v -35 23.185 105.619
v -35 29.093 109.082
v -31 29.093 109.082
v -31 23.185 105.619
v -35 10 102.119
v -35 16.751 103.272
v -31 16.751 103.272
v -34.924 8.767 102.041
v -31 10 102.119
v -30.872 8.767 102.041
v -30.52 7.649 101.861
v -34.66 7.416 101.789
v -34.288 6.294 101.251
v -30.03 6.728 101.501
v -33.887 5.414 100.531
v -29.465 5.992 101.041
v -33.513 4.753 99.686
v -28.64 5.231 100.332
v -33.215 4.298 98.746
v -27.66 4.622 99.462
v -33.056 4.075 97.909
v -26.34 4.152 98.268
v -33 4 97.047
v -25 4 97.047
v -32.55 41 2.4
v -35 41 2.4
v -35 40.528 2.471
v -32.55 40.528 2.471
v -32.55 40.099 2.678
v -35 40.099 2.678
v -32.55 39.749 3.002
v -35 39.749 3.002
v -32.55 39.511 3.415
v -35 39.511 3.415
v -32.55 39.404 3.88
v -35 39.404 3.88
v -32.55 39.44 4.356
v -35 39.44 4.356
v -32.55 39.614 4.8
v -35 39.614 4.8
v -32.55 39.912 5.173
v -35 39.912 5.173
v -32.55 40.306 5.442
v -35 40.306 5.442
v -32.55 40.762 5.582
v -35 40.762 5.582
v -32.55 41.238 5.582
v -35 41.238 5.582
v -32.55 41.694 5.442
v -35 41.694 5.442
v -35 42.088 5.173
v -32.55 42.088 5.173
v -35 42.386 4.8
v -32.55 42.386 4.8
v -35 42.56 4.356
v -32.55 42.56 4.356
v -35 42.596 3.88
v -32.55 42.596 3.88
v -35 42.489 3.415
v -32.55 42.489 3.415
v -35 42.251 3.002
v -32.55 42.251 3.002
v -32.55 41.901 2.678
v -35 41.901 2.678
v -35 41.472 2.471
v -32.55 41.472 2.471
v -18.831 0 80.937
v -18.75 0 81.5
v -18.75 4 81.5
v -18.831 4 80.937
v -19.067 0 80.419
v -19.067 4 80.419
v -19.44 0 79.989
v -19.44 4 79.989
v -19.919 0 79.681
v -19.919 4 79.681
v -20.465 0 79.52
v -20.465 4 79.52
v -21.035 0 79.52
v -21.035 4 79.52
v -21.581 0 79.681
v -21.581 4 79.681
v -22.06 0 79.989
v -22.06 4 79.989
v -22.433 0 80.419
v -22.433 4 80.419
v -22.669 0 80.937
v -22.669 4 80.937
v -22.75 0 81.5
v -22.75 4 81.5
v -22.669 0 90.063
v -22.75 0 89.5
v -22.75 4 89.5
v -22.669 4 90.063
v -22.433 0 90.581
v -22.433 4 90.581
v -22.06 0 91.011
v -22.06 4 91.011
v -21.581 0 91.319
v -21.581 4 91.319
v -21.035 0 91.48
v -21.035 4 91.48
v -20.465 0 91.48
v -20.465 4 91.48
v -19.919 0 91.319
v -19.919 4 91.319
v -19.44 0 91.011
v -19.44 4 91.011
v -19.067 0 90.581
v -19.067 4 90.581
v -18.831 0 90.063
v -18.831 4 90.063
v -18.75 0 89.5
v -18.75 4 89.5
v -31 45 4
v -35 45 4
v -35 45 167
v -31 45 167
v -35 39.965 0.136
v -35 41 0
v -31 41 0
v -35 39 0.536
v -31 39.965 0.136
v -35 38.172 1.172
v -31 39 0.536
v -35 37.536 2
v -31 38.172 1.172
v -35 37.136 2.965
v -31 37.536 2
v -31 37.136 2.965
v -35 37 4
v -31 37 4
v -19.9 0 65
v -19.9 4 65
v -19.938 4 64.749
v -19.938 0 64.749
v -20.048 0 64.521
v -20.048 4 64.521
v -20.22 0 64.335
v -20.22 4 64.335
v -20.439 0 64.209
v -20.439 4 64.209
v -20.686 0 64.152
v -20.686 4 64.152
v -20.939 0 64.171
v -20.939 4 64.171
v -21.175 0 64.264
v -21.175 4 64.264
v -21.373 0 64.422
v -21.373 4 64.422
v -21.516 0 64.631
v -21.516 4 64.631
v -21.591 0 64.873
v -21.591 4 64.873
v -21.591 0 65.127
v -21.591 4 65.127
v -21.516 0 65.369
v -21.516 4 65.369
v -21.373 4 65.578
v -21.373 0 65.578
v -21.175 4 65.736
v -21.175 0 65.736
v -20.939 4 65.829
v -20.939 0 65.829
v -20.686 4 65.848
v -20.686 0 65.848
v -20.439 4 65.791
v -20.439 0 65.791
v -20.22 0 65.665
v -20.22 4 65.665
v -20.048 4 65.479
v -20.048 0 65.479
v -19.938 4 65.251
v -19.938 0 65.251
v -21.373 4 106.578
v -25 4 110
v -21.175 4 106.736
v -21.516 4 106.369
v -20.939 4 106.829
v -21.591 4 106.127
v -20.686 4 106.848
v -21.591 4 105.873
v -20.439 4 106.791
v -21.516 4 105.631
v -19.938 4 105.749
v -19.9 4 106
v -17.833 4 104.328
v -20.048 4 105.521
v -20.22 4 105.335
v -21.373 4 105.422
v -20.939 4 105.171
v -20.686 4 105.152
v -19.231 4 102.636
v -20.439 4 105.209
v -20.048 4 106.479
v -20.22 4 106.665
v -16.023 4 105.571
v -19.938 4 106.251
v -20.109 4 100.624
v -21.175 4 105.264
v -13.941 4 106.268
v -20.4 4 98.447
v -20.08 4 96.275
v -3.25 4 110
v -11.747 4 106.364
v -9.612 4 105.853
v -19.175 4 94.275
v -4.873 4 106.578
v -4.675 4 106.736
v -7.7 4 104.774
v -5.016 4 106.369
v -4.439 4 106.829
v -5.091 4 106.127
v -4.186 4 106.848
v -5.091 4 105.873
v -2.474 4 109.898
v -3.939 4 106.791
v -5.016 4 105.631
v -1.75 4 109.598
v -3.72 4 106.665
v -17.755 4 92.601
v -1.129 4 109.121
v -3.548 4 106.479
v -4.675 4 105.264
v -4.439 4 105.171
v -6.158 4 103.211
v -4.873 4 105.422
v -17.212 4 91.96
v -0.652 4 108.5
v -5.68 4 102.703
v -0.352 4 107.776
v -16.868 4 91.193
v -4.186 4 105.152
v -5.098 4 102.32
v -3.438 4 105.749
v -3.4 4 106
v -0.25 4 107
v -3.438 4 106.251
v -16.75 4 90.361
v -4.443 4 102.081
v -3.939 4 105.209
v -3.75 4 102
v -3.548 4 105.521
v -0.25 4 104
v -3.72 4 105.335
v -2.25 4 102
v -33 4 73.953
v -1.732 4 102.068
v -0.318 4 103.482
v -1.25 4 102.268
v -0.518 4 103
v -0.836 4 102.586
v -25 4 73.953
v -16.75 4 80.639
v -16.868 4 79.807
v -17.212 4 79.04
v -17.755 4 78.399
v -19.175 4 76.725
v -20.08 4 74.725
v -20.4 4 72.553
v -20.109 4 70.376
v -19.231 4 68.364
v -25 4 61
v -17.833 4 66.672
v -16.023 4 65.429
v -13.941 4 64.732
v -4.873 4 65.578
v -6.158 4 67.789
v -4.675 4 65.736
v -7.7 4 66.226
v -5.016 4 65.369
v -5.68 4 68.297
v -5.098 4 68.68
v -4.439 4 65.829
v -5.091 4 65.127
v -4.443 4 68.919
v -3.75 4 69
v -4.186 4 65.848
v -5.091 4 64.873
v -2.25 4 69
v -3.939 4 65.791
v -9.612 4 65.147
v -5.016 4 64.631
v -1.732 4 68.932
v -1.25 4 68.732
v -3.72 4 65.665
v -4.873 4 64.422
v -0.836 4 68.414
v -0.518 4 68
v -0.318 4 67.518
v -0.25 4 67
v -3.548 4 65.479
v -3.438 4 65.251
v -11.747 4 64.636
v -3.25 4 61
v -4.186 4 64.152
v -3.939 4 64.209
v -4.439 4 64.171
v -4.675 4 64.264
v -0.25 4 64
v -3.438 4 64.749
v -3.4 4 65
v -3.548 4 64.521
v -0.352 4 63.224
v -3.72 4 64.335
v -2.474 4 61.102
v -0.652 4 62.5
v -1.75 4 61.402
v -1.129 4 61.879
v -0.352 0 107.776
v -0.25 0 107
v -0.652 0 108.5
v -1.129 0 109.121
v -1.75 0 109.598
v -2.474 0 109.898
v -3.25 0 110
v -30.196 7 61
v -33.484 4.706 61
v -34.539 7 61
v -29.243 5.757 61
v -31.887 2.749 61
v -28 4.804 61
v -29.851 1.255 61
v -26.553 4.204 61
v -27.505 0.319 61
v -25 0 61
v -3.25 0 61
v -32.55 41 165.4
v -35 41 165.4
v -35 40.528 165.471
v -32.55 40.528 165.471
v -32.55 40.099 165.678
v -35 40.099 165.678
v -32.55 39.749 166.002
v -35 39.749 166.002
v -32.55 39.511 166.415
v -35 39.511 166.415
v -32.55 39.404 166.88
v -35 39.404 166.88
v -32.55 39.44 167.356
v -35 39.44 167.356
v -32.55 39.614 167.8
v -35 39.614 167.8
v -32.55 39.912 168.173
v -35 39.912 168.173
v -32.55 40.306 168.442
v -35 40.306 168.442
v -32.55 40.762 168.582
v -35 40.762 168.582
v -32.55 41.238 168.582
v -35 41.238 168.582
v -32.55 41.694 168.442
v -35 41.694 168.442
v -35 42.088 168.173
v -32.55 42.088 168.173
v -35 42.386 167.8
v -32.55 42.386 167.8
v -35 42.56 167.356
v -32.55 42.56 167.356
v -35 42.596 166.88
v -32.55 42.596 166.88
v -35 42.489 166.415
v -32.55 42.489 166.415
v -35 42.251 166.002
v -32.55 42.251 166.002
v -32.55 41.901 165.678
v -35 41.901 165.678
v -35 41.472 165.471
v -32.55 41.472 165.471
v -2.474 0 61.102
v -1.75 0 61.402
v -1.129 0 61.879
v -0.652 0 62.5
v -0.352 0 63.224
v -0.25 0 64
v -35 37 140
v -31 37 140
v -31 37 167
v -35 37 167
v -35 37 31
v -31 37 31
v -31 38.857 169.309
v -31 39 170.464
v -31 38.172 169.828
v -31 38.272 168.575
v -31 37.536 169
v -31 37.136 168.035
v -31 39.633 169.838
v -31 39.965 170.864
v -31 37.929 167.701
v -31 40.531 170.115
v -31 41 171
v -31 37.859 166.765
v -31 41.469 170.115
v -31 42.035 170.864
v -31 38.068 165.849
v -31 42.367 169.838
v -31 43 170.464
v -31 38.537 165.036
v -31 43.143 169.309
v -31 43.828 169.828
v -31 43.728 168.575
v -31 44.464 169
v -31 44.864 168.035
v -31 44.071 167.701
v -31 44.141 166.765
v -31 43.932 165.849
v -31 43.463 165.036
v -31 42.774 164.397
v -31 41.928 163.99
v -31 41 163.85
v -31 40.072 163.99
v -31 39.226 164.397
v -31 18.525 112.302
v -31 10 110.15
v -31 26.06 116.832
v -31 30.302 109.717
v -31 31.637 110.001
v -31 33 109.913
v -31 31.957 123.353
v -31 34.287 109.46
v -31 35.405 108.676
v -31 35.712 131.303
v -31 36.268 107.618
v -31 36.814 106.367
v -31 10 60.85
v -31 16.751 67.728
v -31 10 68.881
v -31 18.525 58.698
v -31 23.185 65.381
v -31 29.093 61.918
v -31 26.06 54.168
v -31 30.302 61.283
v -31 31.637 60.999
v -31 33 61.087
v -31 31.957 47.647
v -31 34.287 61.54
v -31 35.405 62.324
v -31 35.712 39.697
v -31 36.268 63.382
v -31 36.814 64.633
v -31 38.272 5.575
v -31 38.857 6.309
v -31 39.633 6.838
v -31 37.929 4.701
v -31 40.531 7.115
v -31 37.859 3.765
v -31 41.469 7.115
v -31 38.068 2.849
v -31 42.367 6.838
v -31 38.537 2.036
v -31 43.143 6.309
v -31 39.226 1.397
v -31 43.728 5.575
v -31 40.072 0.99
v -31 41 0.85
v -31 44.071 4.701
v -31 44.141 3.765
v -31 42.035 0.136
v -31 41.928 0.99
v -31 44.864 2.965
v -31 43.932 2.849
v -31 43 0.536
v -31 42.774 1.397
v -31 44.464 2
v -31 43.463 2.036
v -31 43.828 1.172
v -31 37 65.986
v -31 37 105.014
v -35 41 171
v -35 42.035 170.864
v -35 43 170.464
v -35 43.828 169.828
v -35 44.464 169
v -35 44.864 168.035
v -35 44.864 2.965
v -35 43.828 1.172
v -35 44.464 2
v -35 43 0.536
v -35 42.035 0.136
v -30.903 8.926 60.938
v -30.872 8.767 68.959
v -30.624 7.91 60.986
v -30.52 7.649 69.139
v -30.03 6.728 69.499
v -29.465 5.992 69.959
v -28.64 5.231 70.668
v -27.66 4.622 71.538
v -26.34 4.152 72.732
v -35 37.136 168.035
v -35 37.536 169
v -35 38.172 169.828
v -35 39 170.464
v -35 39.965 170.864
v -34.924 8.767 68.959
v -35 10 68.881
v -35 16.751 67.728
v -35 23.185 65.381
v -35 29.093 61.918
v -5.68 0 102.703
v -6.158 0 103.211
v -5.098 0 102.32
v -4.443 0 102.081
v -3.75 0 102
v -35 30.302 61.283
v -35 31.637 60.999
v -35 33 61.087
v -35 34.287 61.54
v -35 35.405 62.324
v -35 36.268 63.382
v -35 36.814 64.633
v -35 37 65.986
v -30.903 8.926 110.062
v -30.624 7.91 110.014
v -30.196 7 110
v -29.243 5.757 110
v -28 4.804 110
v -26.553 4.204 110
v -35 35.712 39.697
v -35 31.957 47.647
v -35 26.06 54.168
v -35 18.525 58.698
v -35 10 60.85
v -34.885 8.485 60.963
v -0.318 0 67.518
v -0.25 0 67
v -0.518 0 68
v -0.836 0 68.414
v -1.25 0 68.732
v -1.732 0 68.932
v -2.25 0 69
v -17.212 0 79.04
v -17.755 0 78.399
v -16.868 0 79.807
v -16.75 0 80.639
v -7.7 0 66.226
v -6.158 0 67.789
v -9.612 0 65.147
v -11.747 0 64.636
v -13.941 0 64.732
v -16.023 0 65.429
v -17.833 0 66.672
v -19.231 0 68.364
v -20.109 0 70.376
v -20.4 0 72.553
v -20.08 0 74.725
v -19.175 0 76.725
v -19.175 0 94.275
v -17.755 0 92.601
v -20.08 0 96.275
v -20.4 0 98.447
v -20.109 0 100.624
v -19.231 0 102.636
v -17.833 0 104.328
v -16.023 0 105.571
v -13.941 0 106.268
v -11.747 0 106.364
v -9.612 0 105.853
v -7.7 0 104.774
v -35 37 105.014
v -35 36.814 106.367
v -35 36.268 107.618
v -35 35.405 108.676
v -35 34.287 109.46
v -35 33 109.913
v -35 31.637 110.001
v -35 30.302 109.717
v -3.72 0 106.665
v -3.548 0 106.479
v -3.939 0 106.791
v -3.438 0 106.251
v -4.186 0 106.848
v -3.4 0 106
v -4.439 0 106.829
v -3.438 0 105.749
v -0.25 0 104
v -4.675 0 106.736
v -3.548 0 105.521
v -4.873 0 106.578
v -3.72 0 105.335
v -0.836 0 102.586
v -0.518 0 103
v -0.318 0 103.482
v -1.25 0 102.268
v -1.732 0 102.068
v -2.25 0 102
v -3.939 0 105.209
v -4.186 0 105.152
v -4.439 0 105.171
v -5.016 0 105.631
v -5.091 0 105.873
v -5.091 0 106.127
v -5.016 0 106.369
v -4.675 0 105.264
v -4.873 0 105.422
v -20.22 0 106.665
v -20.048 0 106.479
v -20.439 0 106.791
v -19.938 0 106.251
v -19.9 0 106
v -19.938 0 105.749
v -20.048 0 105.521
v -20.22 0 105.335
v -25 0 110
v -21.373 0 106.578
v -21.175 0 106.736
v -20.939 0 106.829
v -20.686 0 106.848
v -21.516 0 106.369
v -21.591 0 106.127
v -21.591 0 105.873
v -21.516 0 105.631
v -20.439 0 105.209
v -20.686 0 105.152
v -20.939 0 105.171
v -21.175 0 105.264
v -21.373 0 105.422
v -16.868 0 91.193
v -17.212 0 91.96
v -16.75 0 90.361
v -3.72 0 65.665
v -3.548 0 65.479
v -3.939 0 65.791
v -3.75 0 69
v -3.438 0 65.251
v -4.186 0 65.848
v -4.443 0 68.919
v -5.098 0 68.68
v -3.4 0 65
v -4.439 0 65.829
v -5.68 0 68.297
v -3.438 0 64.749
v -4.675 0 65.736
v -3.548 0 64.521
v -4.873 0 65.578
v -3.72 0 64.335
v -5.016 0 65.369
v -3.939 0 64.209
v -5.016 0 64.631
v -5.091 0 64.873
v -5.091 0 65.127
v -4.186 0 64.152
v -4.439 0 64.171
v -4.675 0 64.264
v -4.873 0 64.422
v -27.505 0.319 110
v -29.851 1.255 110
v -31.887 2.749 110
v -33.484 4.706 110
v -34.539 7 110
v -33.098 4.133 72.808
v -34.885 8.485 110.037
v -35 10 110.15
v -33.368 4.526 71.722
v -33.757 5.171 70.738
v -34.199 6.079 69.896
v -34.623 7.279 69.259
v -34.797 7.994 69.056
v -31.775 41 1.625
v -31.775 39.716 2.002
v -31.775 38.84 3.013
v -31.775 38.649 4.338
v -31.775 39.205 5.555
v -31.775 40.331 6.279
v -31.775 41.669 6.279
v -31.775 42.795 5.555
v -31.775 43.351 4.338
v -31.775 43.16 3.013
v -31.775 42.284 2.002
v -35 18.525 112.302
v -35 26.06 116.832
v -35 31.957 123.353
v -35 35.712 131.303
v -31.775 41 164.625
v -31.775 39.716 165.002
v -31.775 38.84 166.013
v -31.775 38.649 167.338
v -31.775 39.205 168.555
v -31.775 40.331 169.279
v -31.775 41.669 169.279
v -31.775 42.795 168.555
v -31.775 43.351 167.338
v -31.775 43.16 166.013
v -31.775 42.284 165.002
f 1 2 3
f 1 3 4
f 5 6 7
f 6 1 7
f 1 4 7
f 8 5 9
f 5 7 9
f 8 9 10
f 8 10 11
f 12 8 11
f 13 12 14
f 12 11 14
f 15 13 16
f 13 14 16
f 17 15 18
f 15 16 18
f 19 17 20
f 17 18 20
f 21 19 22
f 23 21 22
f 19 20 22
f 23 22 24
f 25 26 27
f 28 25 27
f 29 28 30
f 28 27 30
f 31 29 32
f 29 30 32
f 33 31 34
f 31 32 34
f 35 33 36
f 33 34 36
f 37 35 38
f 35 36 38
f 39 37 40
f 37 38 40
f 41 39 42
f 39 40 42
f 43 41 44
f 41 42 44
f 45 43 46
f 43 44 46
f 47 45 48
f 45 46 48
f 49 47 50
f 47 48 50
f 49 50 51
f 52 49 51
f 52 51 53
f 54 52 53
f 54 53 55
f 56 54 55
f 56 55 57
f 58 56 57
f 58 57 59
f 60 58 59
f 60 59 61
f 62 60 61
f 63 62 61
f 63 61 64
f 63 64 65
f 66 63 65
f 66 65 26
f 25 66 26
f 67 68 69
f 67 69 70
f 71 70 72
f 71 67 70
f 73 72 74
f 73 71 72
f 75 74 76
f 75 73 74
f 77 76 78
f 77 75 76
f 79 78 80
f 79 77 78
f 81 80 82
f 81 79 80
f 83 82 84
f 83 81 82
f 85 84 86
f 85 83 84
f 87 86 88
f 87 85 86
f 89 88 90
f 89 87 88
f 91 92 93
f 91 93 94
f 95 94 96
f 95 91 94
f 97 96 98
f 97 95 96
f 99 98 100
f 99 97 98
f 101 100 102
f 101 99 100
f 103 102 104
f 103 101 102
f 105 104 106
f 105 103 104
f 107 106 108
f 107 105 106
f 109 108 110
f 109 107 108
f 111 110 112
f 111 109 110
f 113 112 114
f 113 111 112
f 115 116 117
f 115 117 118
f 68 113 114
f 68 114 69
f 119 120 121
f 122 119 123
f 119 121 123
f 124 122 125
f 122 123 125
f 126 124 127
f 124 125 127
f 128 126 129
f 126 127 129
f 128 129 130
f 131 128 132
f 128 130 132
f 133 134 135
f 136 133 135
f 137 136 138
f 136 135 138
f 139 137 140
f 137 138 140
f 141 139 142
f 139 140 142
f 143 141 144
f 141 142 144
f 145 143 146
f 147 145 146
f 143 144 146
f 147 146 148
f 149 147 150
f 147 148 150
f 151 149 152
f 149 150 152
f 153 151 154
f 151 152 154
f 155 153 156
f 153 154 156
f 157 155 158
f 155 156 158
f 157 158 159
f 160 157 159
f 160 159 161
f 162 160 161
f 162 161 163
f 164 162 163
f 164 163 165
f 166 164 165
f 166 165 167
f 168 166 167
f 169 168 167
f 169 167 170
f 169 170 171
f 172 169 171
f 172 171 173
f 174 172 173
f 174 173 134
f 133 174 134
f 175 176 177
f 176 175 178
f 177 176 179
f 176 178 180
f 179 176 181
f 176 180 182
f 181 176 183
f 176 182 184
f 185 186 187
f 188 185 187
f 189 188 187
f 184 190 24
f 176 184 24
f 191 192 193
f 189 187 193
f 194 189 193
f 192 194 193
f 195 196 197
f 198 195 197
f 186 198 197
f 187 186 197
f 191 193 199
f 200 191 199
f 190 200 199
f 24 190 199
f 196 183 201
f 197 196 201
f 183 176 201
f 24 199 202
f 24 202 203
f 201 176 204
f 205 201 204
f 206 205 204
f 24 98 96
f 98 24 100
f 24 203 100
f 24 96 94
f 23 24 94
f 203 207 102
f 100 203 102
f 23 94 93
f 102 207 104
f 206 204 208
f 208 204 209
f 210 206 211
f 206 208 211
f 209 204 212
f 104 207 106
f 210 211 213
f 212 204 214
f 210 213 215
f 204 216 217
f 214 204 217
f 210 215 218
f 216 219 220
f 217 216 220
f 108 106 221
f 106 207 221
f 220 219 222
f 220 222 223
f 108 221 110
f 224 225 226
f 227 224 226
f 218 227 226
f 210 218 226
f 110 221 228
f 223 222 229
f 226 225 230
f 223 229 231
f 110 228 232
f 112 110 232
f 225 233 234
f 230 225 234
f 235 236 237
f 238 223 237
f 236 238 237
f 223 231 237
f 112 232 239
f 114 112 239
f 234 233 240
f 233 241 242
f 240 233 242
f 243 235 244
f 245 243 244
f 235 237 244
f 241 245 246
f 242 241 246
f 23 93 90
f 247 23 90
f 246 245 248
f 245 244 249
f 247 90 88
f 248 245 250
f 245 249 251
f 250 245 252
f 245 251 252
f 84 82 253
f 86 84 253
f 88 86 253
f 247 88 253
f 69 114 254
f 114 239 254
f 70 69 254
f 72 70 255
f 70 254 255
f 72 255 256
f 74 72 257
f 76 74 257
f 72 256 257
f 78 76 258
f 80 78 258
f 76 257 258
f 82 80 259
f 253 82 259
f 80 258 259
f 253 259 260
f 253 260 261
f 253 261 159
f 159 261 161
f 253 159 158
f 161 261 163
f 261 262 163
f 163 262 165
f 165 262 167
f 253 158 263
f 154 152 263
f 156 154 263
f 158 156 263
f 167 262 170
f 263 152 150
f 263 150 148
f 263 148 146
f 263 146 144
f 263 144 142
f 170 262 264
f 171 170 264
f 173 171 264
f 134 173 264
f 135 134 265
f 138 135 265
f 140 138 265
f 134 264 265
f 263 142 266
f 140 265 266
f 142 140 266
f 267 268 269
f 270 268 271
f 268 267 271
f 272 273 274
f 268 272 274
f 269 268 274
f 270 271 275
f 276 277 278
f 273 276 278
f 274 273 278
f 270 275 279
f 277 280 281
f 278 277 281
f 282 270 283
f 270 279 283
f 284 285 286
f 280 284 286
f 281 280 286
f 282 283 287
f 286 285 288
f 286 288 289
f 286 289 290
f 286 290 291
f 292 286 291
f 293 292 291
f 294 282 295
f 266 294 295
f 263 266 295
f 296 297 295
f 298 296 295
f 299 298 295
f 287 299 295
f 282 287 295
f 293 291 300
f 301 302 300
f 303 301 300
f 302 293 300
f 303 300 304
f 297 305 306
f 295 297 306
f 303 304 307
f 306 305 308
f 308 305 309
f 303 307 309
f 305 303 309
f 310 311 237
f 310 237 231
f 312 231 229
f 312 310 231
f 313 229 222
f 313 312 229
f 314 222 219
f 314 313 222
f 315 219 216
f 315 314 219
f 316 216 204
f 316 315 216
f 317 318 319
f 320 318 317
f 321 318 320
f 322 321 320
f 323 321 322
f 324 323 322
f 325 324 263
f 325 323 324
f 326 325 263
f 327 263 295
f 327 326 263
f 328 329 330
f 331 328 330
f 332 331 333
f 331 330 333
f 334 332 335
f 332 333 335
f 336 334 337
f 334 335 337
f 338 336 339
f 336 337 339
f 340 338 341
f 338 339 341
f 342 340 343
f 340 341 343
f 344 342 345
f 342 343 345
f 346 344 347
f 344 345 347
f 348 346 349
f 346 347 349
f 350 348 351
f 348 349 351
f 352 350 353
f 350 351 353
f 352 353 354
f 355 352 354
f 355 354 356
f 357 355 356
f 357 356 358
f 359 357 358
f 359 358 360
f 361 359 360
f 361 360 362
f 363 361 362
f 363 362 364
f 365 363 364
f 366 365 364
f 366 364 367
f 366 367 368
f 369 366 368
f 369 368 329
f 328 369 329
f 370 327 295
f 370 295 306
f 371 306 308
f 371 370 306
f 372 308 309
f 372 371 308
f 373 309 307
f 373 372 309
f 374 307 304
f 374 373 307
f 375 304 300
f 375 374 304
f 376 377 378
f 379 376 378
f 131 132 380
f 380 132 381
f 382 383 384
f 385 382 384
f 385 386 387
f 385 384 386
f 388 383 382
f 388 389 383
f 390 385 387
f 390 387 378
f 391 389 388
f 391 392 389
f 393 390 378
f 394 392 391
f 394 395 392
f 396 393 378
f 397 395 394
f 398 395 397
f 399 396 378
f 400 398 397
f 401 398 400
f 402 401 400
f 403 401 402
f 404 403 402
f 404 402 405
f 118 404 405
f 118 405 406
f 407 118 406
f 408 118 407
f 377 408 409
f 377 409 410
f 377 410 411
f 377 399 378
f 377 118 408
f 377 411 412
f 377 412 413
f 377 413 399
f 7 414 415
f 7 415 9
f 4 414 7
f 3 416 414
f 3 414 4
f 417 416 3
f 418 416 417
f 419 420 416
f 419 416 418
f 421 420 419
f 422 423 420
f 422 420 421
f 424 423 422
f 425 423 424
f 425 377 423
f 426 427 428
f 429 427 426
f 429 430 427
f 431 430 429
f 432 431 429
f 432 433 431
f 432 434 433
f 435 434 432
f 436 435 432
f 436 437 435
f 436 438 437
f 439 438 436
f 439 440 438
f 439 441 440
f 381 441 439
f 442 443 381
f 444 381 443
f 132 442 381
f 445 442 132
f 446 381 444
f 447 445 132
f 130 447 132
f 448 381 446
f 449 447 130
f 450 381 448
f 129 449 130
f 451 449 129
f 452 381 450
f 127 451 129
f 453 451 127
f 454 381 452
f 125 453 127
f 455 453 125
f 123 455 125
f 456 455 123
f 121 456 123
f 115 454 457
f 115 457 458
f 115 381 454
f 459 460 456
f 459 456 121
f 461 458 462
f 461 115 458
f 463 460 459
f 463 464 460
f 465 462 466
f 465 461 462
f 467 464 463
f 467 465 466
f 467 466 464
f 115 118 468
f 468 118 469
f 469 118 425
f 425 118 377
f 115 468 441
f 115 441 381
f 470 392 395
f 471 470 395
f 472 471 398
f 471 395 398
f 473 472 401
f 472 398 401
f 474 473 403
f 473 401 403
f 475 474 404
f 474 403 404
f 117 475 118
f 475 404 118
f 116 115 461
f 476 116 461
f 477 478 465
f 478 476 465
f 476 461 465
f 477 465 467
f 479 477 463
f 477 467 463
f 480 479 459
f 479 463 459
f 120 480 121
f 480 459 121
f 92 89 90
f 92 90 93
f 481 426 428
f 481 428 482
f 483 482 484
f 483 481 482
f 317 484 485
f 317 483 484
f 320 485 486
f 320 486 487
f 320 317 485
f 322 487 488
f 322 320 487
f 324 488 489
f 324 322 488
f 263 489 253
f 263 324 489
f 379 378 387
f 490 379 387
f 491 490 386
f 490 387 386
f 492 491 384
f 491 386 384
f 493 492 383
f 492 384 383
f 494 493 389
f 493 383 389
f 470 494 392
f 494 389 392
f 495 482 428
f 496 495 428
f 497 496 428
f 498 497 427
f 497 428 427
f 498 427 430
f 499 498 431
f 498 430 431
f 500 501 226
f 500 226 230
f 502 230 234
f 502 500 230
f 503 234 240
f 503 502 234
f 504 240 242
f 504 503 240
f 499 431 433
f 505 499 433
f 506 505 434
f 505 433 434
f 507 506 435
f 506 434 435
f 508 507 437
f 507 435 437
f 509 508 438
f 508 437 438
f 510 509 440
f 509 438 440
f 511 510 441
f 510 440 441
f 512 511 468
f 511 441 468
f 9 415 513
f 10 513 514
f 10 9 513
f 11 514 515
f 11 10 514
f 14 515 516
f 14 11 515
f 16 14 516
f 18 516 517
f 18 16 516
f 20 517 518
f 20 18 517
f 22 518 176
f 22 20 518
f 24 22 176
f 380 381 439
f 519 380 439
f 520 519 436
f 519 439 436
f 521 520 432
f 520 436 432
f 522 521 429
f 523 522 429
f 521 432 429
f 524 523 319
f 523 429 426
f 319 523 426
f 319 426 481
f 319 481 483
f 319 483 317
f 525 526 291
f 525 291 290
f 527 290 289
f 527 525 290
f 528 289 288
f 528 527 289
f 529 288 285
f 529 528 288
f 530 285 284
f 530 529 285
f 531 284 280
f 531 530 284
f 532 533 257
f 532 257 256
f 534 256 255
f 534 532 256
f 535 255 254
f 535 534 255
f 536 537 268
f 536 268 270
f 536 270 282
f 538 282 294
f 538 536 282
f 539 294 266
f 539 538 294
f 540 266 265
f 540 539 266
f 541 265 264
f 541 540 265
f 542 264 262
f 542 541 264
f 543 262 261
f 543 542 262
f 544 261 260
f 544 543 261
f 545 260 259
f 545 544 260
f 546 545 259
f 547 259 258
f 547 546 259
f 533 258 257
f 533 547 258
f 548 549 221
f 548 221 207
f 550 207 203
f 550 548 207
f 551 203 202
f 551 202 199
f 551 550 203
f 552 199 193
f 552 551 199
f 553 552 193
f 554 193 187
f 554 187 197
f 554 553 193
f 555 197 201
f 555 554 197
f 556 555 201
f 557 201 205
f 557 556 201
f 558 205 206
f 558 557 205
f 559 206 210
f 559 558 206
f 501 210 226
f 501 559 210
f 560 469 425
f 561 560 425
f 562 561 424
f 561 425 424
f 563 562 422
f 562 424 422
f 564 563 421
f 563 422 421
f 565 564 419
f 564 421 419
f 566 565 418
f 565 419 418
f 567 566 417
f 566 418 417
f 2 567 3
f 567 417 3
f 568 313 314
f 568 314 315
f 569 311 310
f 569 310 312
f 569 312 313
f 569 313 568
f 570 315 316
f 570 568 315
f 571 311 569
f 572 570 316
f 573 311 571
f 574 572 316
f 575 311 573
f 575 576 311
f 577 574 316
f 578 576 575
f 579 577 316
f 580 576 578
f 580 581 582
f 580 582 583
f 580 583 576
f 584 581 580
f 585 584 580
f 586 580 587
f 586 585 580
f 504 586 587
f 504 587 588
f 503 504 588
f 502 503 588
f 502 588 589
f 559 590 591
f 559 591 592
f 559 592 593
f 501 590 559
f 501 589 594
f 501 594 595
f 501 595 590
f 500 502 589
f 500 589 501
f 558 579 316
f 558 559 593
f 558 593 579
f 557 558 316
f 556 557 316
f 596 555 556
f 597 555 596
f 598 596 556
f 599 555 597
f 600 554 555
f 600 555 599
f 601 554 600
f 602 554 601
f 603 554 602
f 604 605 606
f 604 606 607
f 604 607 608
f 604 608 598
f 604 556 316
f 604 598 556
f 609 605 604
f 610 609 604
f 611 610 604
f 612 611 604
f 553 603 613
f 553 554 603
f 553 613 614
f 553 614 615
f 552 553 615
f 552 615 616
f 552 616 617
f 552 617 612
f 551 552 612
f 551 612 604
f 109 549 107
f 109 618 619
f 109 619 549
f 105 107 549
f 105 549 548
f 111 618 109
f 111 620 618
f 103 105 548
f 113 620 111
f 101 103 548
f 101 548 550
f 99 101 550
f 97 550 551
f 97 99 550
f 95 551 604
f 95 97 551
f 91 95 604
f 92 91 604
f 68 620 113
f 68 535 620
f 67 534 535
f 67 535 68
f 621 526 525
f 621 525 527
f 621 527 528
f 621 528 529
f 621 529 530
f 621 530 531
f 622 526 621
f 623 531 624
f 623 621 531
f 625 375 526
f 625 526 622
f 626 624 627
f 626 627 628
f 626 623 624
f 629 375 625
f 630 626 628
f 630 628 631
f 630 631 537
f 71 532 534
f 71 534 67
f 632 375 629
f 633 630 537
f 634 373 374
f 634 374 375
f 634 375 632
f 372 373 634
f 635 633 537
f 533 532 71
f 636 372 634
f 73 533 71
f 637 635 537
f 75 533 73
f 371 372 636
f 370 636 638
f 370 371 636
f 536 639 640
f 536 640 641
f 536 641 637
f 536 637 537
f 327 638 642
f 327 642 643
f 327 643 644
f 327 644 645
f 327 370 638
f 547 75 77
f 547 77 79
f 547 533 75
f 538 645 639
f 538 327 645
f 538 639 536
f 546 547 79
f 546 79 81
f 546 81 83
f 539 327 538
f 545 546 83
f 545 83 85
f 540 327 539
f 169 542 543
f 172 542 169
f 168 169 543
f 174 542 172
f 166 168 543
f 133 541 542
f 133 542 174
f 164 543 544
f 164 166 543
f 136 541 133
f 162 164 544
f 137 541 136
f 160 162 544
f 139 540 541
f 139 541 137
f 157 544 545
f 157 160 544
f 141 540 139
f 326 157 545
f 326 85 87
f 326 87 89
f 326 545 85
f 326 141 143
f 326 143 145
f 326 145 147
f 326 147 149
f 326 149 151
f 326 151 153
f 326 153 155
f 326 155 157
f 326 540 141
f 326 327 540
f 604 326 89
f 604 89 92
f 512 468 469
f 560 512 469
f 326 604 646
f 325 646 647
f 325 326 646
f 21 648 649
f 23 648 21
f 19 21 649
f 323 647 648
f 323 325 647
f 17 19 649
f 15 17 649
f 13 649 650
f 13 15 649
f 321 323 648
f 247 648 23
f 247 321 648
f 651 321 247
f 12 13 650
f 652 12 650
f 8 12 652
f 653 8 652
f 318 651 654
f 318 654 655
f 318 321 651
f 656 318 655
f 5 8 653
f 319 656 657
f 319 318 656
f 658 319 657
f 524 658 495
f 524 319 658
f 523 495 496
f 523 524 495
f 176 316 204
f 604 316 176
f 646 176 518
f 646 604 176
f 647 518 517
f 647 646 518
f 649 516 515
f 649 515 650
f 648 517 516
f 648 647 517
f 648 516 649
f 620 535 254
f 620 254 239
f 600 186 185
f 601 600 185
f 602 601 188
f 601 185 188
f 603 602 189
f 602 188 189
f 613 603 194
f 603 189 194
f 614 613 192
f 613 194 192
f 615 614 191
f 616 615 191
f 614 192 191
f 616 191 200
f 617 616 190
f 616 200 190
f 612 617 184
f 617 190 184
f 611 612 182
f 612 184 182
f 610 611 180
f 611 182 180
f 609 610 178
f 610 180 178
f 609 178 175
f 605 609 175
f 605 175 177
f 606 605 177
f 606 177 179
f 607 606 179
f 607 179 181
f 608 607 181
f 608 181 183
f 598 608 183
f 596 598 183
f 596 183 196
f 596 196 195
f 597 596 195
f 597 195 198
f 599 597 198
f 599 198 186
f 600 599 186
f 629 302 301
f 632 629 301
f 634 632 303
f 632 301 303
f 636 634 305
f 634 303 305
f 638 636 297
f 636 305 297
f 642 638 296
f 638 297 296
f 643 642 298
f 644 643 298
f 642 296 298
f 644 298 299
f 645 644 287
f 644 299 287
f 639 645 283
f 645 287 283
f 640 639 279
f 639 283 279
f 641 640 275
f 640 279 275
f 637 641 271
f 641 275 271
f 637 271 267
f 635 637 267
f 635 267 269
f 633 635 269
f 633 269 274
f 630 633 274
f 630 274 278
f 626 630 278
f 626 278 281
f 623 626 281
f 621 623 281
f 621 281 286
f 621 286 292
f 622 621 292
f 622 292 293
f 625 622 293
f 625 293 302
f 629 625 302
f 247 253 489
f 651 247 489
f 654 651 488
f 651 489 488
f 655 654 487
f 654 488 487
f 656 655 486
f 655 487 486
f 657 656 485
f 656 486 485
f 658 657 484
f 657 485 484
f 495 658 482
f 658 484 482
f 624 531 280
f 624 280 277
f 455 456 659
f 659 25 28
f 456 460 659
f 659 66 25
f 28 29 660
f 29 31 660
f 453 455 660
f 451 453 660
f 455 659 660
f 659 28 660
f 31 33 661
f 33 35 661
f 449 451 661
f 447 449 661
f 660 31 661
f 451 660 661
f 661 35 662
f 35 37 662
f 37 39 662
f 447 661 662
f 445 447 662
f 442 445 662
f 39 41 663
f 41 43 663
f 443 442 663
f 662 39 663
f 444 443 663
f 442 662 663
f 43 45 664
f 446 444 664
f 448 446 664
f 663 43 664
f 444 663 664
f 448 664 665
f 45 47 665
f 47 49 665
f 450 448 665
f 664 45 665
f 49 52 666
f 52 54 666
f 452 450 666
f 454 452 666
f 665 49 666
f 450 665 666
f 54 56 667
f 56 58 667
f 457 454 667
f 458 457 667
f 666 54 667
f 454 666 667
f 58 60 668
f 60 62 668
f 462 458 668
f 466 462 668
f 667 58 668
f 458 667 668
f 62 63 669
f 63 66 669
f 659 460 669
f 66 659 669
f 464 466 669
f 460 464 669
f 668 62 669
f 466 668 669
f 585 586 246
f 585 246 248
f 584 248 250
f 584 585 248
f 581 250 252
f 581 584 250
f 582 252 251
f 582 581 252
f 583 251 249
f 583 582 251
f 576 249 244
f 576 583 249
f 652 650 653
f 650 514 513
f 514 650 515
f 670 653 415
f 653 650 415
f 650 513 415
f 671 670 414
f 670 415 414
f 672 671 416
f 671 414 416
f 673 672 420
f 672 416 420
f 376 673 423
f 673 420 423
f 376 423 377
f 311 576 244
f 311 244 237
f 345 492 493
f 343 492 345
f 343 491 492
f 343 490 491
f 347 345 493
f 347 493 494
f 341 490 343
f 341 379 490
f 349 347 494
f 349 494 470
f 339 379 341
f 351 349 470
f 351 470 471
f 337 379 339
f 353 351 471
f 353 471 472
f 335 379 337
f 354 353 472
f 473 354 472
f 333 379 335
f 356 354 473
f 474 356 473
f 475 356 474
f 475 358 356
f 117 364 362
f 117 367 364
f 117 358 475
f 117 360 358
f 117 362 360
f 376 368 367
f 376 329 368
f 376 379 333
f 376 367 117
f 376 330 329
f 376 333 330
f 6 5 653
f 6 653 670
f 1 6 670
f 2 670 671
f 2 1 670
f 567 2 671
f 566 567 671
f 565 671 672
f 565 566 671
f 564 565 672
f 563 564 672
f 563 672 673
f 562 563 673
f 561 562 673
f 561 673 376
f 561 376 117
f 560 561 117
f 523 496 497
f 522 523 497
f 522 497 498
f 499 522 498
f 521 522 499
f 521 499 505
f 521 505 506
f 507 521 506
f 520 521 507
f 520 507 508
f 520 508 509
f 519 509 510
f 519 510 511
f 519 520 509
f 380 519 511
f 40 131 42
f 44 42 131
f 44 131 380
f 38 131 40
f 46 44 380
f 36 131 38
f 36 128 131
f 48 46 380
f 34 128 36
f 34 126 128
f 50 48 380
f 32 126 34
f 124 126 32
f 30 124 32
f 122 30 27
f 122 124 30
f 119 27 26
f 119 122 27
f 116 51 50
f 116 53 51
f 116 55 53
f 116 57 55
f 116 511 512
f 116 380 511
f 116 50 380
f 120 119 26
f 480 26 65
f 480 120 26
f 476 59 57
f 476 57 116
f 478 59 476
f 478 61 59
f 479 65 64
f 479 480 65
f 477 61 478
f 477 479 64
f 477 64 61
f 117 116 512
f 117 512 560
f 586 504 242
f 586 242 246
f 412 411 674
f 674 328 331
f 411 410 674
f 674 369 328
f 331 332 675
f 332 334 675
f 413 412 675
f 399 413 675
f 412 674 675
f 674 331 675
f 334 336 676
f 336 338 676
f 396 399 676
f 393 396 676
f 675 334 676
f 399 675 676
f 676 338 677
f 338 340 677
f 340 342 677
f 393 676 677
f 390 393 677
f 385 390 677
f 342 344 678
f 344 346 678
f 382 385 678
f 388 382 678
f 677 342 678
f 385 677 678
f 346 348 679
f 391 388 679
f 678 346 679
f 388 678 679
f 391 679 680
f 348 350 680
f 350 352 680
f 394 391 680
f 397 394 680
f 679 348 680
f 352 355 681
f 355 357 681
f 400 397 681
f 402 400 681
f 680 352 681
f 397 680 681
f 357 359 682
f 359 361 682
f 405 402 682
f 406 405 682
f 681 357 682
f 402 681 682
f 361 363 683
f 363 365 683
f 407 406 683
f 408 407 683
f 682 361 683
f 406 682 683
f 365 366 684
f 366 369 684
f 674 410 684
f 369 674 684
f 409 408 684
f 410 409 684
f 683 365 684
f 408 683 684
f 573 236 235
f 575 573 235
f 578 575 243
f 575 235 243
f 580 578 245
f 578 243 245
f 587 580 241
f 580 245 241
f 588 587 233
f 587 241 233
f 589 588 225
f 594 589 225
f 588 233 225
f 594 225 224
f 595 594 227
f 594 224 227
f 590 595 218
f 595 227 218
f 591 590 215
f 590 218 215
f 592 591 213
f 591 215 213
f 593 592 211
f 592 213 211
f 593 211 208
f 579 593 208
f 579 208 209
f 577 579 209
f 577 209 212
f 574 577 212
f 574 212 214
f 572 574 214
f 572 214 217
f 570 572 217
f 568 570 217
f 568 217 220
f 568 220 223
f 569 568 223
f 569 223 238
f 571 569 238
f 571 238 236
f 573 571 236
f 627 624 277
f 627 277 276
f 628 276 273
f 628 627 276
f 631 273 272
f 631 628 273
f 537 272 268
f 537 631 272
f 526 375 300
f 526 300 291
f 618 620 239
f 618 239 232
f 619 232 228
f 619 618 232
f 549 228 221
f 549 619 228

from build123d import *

# Parameters (mm, degrees)
BOSS_EXTRU_1_DEPTH                             = 171
FRAISAGE_POUR_VIS_T_TE_FRAIS_E_M31_D           = 3.2
FRAISAGE_POUR_VIS_T_TE_FRAIS_E_M31_DEPTH       = 4
FRAISAGE_POUR_VIS_T_TE_FRAIS_E_M31_CSINK_D     = 6.3
FRAISAGE_POUR_VIS_T_TE_FRAIS_E_M31_CSINK_ANGLE = 90
D_GAGEMENT_M1_61_D                             = 1.7
D_GAGEMENT_M1_61_DEPTH                         = 4
ENL_V_MAT_EXTRU_1_DEPTH                        = 4
ENL_V_MAT_EXTRU_2_DEPTH                        = 31.75
ENL_V_MAT_EXTRU_2_DEPTH_BACK                   = 5


with BuildPart() as part:
    # Esquisse1 → Boss.-Extru.1 (new body)
    with BuildSketch(Plane.XY):
        with BuildLine():
            Line((0, 0), (-25, 0))
            ThreePointArc((-25, 0), (-32.071067812, 2.928932188), (-35, 10))
            Line((-35, 10), (-35, 45))
            Line((-35, 45), (-31, 45))
            Line((-31, 45), (-31, 10))
            ThreePointArc((-31, 10), (-29.242640687, 5.757359313), (-25, 4))
            Line((-25, 4), (0, 4))
            Line((0, 4), (0, 0))
        make_face()
    extrude(amount=BOSS_EXTRU_1_DEPTH)

    # Fraisage pour vis à tête fraisée M31
    with Locations(Plane(origin=(-31, 0, 0), x_dir=(0, 0, 1), z_dir=(1, 0, 0))):
        with Locations((4, -41), (167, -41)):
            CounterSinkHole(FRAISAGE_POUR_VIS_T_TE_FRAIS_E_M31_D / 2, FRAISAGE_POUR_VIS_T_TE_FRAIS_E_M31_CSINK_D / 2, depth=FRAISAGE_POUR_VIS_T_TE_FRAIS_E_M31_DEPTH, counter_sink_angle=FRAISAGE_POUR_VIS_T_TE_FRAIS_E_M31_CSINK_ANGLE)

    # Dégagement M1.61
    with Locations(Plane(origin=(0, 0, 0), x_dir=(-1, 0, 0), z_dir=(0, -1, 0))):
        with Locations((20.75, -65), (20.75, -106), (4.25, -106), (4.25, -65)):
            Hole(D_GAGEMENT_M1_61_D / 2, depth=D_GAGEMENT_M1_61_DEPTH)

    # Esquisse6 → Enlèv. mat.-Extru.1 (cut)
    with BuildSketch(Plane.XZ):
        with BuildLine():
            Line((-35, 61), (-3.25, 61))
            ThreePointArc((-3.25, 61), (-1.128679656, 61.878679656), (-0.25, 64))
            Line((-0.25, 64), (-0.25, 67))
            ThreePointArc((-0.25, 67), (-0.835786438, 68.414213562), (-2.25, 69))
            Line((-2.25, 69), (-3.750142858, 69))
            ThreePointArc((-3.750142858, 69), (-5.097923909, 68.680202649), (-6.15836042, 67.788990826))
            ThreePointArc((-6.15836042, 67.788990826), (-17.832822404, 66.671534919), (-17.754587156, 78.399094322))
            ThreePointArc((-17.754587156, 78.399094322), (-17.012643745, 79.411706018), (-16.75, 80.639256723))
            Line((-16.75, 80.639256723), (-16.75, 90.360743277))
            ThreePointArc((-16.75, 90.360743277), (-17.012643745, 91.588293982), (-17.754587156, 92.600905678))
            ThreePointArc((-17.754587156, 92.600905678), (-17.832822404, 104.328465081), (-6.15836042, 103.211009174))
            ThreePointArc((-6.15836042, 103.211009174), (-5.097923909, 102.319797351), (-3.750142858, 102))
            Line((-3.750142858, 102), (-2.25, 102))
            ThreePointArc((-2.25, 102), (-0.835786438, 102.585786438), (-0.25, 104))
            Line((-0.25, 104), (-0.25, 107))
            ThreePointArc((-0.25, 107), (-1.128679656, 109.121320344), (-3.25, 110))
            Line((-3.25, 110), (-35, 110))
            Line((-35, 110), (-35, 171))
            Line((-35, 171), (0, 171))
            Line((0, 171), (0, 0))
            Line((0, 0), (-35, 0))
            Line((-35, 0), (-35, 61))
        make_face()
        with BuildLine():
            Line((-18.75, 89.5), (-18.75, 81.5))
            ThreePointArc((-18.75, 81.5), (-20.75, 79.5), (-22.75, 81.5))
            Line((-22.75, 81.5), (-22.75, 89.5))
            ThreePointArc((-22.75, 89.5), (-20.75, 91.5), (-18.75, 89.5))
        make_face()
    extrude(amount=-ENL_V_MAT_EXTRU_1_DEPTH, mode=Mode.SUBTRACT)

    # Esquisse7 → Enlèv. mat.-Extru.2 (cut, two sides)
    with BuildSketch(Plane(origin=(-31, 0, 0), x_dir=(0, 0, -1), z_dir=(1, 0, 0))) as enl_v_mat_extru_2_sk:
        with BuildLine():
            ThreePointArc((-4, 45), (-1.171572875, 43.828427125), (0, 41))
            Line((0, 41), (0, 45))
            Line((0, 45), (-4, 45))
        make_face()
        with BuildLine():
            Line((0, 4), (0, 41))
            ThreePointArc((0, 41), (-1.171572875, 38.171572875), (-4, 37))
            Line((-4, 37), (-31, 37))
            ThreePointArc((-31, 37), (-52.213203436, 28.213203436), (-61, 7))
            Line((-61, 7), (-61, 4))
            Line((-61, 4), (0, 4))
        make_face()
        with BuildLine():
            ThreePointArc((-167, 37), (-169.828427125, 38.171572875), (-171, 41))
            Line((-171, 41), (-171, 4))
            Line((-171, 4), (-110, 4))
            Line((-110, 4), (-110, 7))
            ThreePointArc((-110, 7), (-118.786796564, 28.213203436), (-140, 37))
            Line((-140, 37), (-167, 37))
        make_face()
        with BuildLine():
            Line((-171, 45), (-171, 41))
            ThreePointArc((-171, 41), (-169.828427125, 43.828427125), (-167, 45))
            Line((-167, 45), (-171, 45))
        make_face()
        with BuildLine():
            Line((-65.985711369, 37), (-105.014288631, 37))
            ThreePointArc((-105.014288631, 37), (-109.460347769, 34.287478555), (-109.082394604, 29.093023256))
            ThreePointArc((-109.082394604, 29.093023256), (-104.093528666, 19.438863146), (-102.041125553, 8.76744186))
            ThreePointArc((-102.041125553, 8.76744186), (-100.498870029, 5.383178834), (-97.04653681, 4))
            Line((-97.04653681, 4), (-73.95346319, 4))
            ThreePointArc((-73.95346319, 4), (-70.501129971, 5.383178834), (-68.958874447, 8.76744186))
            ThreePointArc((-68.958874447, 8.76744186), (-66.906471334, 19.438863146), (-61.917605396, 29.093023256))
            ThreePointArc((-61.917605396, 29.093023256), (-61.539652231, 34.287478555), (-65.985711369, 37))
        make_face()
    extrude(amount=ENL_V_MAT_EXTRU_2_DEPTH, mode=Mode.SUBTRACT)
    extrude(enl_v_mat_extru_2_sk.sketch, amount=-ENL_V_MAT_EXTRU_2_DEPTH_BACK, mode=Mode.SUBTRACT)


solid = part.part
